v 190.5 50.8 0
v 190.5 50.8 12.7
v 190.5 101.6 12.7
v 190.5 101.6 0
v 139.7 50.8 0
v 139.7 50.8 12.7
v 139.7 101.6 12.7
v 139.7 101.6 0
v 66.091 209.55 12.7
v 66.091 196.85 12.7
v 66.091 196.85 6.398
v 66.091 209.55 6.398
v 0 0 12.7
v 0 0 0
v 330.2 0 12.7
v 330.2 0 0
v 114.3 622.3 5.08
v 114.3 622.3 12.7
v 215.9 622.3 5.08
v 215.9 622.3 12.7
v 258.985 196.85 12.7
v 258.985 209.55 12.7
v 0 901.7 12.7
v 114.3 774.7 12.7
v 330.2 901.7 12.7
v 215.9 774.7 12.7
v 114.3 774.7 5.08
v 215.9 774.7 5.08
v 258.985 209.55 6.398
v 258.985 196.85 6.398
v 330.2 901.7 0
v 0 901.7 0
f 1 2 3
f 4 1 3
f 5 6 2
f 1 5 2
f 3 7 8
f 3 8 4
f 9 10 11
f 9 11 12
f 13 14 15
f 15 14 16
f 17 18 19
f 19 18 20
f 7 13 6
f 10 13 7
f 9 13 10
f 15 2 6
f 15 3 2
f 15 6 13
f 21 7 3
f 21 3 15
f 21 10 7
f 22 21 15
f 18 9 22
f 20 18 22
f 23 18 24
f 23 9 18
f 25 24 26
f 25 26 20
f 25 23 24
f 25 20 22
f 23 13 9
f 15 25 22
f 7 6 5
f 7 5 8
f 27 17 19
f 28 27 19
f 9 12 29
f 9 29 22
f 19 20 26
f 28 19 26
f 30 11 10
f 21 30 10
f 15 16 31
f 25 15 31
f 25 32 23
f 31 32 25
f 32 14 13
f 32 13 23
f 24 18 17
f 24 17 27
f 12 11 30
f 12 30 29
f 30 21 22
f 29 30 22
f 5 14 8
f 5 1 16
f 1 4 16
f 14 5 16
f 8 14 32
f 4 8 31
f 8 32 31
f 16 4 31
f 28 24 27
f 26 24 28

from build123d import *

# Parameters (mm, degrees)
SKETCH1_W           = 330.2
SKETCH1_H           = 901.7
BOSS_EXTRUDE1_DEPTH = 12.7
SKETCH2_W           = 101.6
SKETCH2_H           = 152.4
CUT_EXTRUDE1_DEPTH  = 7.62
SKETCH3_W           = 50.8
SKETCH3_H           = 50.8
CUT_EXTRUDE2_DEPTH  = 961.341720431
CAVITY1_START       = 66.091277654
CAVITY1_OUTLINE_W   = 12.7
CAVITY1_OUTLINE_H   = 6.301813258
CAVITY1_DEPTH       = 192.893313571


# Read off the part's stored shape, not the designer's step: Cavity1
with BuildPart() as part:
    # Sketch1 → Boss-Extrude1 (new body)
    with BuildSketch(Plane.XY):
        with Locations((165.1, 450.85)):
            Rectangle(SKETCH1_W, SKETCH1_H)
    extrude(amount=BOSS_EXTRUDE1_DEPTH)

    # Sketch2 → Cut-Extrude1 (cut)
    with BuildSketch(Plane.XY.offset(12.7)):
        with Locations((165.1, 698.5)):
            Rectangle(SKETCH2_W, SKETCH2_H)
    extrude(amount=-CUT_EXTRUDE1_DEPTH, mode=Mode.SUBTRACT)

    # Sketch3 → Cut-Extrude2 (cut, through all)
    with BuildSketch(Plane.XY.offset(12.7)):
        with Locations((165.1, 76.2)):
            Rectangle(SKETCH3_W, SKETCH3_H)
    extrude(amount=-CUT_EXTRUDE2_DEPTH, mode=Mode.SUBTRACT)

    # Cavity1 outline → Cavity1 (cut)
    with BuildSketch(Plane.YZ.offset(CAVITY1_START)):
        with Locations((203.2, 9.549093371)):
            Rectangle(CAVITY1_OUTLINE_W, CAVITY1_OUTLINE_H)
    extrude(amount=CAVITY1_DEPTH, mode=Mode.SUBTRACT)


solid = part.part
